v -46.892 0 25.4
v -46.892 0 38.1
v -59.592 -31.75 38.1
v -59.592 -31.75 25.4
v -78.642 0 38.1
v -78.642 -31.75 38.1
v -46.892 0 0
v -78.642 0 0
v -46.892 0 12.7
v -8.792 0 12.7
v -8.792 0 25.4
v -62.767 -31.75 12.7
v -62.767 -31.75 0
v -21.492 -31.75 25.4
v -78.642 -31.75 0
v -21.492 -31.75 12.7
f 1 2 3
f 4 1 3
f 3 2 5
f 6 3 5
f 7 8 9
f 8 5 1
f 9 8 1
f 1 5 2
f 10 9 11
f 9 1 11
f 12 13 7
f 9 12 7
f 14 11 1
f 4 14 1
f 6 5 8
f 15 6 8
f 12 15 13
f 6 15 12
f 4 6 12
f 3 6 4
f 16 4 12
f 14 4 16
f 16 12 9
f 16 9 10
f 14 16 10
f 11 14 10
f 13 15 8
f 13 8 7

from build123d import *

# Parameters (mm, degrees)
F1_DEPTH = 31.75
F3_DEPTH = 12.7
F5_DEPTH = 12.7
F7_DEPTH = 12.7


with BuildPart() as f1:
    # F0 (on Front) → F1 (new body)
    with BuildSketch(Plane.XZ):
        Polygon((-78.642312, 38.1), (-78.642312, 0), (-46.892312, 0), (-46.892312, 12.7), (-8.792312, 12.7), (-8.792312, 25.4), (-46.892312, 25.4), (-46.892312, 38.1), align=None)
    extrude(amount=F1_DEPTH)

    # F2 (on face) → F3 (cut)
    with BuildSketch(Plane(origin=(0, 0, 0), x_dir=(1, 0, 0), z_dir=(0, 0, -1))):
        Polygon((-46.892312, 31.75), (-62.767312, 31.75), (-46.892312, 0), align=None)
    extrude(amount=-F3_DEPTH, mode=Mode.SUBTRACT)

    # F4 (on face) → F5 (cut)
    with BuildSketch(Plane.XY.offset(38.1)):
        Polygon((-46.892312, 0), (-59.592312, -31.75), (-46.892312, -31.75), align=None)
    extrude(amount=-F5_DEPTH, mode=Mode.SUBTRACT)

    # F6 (on face) → F7 (cut)
    with BuildSketch(Plane(origin=(0, 0, 12.7), x_dir=(1, 0, 0), z_dir=(0, 0, -1))):
        Polygon((-8.792312, 31.75), (-21.492312, 31.75), (-8.792312, 0), align=None)
    extrude(amount=-F7_DEPTH, mode=Mode.SUBTRACT)


solid = f1.part
